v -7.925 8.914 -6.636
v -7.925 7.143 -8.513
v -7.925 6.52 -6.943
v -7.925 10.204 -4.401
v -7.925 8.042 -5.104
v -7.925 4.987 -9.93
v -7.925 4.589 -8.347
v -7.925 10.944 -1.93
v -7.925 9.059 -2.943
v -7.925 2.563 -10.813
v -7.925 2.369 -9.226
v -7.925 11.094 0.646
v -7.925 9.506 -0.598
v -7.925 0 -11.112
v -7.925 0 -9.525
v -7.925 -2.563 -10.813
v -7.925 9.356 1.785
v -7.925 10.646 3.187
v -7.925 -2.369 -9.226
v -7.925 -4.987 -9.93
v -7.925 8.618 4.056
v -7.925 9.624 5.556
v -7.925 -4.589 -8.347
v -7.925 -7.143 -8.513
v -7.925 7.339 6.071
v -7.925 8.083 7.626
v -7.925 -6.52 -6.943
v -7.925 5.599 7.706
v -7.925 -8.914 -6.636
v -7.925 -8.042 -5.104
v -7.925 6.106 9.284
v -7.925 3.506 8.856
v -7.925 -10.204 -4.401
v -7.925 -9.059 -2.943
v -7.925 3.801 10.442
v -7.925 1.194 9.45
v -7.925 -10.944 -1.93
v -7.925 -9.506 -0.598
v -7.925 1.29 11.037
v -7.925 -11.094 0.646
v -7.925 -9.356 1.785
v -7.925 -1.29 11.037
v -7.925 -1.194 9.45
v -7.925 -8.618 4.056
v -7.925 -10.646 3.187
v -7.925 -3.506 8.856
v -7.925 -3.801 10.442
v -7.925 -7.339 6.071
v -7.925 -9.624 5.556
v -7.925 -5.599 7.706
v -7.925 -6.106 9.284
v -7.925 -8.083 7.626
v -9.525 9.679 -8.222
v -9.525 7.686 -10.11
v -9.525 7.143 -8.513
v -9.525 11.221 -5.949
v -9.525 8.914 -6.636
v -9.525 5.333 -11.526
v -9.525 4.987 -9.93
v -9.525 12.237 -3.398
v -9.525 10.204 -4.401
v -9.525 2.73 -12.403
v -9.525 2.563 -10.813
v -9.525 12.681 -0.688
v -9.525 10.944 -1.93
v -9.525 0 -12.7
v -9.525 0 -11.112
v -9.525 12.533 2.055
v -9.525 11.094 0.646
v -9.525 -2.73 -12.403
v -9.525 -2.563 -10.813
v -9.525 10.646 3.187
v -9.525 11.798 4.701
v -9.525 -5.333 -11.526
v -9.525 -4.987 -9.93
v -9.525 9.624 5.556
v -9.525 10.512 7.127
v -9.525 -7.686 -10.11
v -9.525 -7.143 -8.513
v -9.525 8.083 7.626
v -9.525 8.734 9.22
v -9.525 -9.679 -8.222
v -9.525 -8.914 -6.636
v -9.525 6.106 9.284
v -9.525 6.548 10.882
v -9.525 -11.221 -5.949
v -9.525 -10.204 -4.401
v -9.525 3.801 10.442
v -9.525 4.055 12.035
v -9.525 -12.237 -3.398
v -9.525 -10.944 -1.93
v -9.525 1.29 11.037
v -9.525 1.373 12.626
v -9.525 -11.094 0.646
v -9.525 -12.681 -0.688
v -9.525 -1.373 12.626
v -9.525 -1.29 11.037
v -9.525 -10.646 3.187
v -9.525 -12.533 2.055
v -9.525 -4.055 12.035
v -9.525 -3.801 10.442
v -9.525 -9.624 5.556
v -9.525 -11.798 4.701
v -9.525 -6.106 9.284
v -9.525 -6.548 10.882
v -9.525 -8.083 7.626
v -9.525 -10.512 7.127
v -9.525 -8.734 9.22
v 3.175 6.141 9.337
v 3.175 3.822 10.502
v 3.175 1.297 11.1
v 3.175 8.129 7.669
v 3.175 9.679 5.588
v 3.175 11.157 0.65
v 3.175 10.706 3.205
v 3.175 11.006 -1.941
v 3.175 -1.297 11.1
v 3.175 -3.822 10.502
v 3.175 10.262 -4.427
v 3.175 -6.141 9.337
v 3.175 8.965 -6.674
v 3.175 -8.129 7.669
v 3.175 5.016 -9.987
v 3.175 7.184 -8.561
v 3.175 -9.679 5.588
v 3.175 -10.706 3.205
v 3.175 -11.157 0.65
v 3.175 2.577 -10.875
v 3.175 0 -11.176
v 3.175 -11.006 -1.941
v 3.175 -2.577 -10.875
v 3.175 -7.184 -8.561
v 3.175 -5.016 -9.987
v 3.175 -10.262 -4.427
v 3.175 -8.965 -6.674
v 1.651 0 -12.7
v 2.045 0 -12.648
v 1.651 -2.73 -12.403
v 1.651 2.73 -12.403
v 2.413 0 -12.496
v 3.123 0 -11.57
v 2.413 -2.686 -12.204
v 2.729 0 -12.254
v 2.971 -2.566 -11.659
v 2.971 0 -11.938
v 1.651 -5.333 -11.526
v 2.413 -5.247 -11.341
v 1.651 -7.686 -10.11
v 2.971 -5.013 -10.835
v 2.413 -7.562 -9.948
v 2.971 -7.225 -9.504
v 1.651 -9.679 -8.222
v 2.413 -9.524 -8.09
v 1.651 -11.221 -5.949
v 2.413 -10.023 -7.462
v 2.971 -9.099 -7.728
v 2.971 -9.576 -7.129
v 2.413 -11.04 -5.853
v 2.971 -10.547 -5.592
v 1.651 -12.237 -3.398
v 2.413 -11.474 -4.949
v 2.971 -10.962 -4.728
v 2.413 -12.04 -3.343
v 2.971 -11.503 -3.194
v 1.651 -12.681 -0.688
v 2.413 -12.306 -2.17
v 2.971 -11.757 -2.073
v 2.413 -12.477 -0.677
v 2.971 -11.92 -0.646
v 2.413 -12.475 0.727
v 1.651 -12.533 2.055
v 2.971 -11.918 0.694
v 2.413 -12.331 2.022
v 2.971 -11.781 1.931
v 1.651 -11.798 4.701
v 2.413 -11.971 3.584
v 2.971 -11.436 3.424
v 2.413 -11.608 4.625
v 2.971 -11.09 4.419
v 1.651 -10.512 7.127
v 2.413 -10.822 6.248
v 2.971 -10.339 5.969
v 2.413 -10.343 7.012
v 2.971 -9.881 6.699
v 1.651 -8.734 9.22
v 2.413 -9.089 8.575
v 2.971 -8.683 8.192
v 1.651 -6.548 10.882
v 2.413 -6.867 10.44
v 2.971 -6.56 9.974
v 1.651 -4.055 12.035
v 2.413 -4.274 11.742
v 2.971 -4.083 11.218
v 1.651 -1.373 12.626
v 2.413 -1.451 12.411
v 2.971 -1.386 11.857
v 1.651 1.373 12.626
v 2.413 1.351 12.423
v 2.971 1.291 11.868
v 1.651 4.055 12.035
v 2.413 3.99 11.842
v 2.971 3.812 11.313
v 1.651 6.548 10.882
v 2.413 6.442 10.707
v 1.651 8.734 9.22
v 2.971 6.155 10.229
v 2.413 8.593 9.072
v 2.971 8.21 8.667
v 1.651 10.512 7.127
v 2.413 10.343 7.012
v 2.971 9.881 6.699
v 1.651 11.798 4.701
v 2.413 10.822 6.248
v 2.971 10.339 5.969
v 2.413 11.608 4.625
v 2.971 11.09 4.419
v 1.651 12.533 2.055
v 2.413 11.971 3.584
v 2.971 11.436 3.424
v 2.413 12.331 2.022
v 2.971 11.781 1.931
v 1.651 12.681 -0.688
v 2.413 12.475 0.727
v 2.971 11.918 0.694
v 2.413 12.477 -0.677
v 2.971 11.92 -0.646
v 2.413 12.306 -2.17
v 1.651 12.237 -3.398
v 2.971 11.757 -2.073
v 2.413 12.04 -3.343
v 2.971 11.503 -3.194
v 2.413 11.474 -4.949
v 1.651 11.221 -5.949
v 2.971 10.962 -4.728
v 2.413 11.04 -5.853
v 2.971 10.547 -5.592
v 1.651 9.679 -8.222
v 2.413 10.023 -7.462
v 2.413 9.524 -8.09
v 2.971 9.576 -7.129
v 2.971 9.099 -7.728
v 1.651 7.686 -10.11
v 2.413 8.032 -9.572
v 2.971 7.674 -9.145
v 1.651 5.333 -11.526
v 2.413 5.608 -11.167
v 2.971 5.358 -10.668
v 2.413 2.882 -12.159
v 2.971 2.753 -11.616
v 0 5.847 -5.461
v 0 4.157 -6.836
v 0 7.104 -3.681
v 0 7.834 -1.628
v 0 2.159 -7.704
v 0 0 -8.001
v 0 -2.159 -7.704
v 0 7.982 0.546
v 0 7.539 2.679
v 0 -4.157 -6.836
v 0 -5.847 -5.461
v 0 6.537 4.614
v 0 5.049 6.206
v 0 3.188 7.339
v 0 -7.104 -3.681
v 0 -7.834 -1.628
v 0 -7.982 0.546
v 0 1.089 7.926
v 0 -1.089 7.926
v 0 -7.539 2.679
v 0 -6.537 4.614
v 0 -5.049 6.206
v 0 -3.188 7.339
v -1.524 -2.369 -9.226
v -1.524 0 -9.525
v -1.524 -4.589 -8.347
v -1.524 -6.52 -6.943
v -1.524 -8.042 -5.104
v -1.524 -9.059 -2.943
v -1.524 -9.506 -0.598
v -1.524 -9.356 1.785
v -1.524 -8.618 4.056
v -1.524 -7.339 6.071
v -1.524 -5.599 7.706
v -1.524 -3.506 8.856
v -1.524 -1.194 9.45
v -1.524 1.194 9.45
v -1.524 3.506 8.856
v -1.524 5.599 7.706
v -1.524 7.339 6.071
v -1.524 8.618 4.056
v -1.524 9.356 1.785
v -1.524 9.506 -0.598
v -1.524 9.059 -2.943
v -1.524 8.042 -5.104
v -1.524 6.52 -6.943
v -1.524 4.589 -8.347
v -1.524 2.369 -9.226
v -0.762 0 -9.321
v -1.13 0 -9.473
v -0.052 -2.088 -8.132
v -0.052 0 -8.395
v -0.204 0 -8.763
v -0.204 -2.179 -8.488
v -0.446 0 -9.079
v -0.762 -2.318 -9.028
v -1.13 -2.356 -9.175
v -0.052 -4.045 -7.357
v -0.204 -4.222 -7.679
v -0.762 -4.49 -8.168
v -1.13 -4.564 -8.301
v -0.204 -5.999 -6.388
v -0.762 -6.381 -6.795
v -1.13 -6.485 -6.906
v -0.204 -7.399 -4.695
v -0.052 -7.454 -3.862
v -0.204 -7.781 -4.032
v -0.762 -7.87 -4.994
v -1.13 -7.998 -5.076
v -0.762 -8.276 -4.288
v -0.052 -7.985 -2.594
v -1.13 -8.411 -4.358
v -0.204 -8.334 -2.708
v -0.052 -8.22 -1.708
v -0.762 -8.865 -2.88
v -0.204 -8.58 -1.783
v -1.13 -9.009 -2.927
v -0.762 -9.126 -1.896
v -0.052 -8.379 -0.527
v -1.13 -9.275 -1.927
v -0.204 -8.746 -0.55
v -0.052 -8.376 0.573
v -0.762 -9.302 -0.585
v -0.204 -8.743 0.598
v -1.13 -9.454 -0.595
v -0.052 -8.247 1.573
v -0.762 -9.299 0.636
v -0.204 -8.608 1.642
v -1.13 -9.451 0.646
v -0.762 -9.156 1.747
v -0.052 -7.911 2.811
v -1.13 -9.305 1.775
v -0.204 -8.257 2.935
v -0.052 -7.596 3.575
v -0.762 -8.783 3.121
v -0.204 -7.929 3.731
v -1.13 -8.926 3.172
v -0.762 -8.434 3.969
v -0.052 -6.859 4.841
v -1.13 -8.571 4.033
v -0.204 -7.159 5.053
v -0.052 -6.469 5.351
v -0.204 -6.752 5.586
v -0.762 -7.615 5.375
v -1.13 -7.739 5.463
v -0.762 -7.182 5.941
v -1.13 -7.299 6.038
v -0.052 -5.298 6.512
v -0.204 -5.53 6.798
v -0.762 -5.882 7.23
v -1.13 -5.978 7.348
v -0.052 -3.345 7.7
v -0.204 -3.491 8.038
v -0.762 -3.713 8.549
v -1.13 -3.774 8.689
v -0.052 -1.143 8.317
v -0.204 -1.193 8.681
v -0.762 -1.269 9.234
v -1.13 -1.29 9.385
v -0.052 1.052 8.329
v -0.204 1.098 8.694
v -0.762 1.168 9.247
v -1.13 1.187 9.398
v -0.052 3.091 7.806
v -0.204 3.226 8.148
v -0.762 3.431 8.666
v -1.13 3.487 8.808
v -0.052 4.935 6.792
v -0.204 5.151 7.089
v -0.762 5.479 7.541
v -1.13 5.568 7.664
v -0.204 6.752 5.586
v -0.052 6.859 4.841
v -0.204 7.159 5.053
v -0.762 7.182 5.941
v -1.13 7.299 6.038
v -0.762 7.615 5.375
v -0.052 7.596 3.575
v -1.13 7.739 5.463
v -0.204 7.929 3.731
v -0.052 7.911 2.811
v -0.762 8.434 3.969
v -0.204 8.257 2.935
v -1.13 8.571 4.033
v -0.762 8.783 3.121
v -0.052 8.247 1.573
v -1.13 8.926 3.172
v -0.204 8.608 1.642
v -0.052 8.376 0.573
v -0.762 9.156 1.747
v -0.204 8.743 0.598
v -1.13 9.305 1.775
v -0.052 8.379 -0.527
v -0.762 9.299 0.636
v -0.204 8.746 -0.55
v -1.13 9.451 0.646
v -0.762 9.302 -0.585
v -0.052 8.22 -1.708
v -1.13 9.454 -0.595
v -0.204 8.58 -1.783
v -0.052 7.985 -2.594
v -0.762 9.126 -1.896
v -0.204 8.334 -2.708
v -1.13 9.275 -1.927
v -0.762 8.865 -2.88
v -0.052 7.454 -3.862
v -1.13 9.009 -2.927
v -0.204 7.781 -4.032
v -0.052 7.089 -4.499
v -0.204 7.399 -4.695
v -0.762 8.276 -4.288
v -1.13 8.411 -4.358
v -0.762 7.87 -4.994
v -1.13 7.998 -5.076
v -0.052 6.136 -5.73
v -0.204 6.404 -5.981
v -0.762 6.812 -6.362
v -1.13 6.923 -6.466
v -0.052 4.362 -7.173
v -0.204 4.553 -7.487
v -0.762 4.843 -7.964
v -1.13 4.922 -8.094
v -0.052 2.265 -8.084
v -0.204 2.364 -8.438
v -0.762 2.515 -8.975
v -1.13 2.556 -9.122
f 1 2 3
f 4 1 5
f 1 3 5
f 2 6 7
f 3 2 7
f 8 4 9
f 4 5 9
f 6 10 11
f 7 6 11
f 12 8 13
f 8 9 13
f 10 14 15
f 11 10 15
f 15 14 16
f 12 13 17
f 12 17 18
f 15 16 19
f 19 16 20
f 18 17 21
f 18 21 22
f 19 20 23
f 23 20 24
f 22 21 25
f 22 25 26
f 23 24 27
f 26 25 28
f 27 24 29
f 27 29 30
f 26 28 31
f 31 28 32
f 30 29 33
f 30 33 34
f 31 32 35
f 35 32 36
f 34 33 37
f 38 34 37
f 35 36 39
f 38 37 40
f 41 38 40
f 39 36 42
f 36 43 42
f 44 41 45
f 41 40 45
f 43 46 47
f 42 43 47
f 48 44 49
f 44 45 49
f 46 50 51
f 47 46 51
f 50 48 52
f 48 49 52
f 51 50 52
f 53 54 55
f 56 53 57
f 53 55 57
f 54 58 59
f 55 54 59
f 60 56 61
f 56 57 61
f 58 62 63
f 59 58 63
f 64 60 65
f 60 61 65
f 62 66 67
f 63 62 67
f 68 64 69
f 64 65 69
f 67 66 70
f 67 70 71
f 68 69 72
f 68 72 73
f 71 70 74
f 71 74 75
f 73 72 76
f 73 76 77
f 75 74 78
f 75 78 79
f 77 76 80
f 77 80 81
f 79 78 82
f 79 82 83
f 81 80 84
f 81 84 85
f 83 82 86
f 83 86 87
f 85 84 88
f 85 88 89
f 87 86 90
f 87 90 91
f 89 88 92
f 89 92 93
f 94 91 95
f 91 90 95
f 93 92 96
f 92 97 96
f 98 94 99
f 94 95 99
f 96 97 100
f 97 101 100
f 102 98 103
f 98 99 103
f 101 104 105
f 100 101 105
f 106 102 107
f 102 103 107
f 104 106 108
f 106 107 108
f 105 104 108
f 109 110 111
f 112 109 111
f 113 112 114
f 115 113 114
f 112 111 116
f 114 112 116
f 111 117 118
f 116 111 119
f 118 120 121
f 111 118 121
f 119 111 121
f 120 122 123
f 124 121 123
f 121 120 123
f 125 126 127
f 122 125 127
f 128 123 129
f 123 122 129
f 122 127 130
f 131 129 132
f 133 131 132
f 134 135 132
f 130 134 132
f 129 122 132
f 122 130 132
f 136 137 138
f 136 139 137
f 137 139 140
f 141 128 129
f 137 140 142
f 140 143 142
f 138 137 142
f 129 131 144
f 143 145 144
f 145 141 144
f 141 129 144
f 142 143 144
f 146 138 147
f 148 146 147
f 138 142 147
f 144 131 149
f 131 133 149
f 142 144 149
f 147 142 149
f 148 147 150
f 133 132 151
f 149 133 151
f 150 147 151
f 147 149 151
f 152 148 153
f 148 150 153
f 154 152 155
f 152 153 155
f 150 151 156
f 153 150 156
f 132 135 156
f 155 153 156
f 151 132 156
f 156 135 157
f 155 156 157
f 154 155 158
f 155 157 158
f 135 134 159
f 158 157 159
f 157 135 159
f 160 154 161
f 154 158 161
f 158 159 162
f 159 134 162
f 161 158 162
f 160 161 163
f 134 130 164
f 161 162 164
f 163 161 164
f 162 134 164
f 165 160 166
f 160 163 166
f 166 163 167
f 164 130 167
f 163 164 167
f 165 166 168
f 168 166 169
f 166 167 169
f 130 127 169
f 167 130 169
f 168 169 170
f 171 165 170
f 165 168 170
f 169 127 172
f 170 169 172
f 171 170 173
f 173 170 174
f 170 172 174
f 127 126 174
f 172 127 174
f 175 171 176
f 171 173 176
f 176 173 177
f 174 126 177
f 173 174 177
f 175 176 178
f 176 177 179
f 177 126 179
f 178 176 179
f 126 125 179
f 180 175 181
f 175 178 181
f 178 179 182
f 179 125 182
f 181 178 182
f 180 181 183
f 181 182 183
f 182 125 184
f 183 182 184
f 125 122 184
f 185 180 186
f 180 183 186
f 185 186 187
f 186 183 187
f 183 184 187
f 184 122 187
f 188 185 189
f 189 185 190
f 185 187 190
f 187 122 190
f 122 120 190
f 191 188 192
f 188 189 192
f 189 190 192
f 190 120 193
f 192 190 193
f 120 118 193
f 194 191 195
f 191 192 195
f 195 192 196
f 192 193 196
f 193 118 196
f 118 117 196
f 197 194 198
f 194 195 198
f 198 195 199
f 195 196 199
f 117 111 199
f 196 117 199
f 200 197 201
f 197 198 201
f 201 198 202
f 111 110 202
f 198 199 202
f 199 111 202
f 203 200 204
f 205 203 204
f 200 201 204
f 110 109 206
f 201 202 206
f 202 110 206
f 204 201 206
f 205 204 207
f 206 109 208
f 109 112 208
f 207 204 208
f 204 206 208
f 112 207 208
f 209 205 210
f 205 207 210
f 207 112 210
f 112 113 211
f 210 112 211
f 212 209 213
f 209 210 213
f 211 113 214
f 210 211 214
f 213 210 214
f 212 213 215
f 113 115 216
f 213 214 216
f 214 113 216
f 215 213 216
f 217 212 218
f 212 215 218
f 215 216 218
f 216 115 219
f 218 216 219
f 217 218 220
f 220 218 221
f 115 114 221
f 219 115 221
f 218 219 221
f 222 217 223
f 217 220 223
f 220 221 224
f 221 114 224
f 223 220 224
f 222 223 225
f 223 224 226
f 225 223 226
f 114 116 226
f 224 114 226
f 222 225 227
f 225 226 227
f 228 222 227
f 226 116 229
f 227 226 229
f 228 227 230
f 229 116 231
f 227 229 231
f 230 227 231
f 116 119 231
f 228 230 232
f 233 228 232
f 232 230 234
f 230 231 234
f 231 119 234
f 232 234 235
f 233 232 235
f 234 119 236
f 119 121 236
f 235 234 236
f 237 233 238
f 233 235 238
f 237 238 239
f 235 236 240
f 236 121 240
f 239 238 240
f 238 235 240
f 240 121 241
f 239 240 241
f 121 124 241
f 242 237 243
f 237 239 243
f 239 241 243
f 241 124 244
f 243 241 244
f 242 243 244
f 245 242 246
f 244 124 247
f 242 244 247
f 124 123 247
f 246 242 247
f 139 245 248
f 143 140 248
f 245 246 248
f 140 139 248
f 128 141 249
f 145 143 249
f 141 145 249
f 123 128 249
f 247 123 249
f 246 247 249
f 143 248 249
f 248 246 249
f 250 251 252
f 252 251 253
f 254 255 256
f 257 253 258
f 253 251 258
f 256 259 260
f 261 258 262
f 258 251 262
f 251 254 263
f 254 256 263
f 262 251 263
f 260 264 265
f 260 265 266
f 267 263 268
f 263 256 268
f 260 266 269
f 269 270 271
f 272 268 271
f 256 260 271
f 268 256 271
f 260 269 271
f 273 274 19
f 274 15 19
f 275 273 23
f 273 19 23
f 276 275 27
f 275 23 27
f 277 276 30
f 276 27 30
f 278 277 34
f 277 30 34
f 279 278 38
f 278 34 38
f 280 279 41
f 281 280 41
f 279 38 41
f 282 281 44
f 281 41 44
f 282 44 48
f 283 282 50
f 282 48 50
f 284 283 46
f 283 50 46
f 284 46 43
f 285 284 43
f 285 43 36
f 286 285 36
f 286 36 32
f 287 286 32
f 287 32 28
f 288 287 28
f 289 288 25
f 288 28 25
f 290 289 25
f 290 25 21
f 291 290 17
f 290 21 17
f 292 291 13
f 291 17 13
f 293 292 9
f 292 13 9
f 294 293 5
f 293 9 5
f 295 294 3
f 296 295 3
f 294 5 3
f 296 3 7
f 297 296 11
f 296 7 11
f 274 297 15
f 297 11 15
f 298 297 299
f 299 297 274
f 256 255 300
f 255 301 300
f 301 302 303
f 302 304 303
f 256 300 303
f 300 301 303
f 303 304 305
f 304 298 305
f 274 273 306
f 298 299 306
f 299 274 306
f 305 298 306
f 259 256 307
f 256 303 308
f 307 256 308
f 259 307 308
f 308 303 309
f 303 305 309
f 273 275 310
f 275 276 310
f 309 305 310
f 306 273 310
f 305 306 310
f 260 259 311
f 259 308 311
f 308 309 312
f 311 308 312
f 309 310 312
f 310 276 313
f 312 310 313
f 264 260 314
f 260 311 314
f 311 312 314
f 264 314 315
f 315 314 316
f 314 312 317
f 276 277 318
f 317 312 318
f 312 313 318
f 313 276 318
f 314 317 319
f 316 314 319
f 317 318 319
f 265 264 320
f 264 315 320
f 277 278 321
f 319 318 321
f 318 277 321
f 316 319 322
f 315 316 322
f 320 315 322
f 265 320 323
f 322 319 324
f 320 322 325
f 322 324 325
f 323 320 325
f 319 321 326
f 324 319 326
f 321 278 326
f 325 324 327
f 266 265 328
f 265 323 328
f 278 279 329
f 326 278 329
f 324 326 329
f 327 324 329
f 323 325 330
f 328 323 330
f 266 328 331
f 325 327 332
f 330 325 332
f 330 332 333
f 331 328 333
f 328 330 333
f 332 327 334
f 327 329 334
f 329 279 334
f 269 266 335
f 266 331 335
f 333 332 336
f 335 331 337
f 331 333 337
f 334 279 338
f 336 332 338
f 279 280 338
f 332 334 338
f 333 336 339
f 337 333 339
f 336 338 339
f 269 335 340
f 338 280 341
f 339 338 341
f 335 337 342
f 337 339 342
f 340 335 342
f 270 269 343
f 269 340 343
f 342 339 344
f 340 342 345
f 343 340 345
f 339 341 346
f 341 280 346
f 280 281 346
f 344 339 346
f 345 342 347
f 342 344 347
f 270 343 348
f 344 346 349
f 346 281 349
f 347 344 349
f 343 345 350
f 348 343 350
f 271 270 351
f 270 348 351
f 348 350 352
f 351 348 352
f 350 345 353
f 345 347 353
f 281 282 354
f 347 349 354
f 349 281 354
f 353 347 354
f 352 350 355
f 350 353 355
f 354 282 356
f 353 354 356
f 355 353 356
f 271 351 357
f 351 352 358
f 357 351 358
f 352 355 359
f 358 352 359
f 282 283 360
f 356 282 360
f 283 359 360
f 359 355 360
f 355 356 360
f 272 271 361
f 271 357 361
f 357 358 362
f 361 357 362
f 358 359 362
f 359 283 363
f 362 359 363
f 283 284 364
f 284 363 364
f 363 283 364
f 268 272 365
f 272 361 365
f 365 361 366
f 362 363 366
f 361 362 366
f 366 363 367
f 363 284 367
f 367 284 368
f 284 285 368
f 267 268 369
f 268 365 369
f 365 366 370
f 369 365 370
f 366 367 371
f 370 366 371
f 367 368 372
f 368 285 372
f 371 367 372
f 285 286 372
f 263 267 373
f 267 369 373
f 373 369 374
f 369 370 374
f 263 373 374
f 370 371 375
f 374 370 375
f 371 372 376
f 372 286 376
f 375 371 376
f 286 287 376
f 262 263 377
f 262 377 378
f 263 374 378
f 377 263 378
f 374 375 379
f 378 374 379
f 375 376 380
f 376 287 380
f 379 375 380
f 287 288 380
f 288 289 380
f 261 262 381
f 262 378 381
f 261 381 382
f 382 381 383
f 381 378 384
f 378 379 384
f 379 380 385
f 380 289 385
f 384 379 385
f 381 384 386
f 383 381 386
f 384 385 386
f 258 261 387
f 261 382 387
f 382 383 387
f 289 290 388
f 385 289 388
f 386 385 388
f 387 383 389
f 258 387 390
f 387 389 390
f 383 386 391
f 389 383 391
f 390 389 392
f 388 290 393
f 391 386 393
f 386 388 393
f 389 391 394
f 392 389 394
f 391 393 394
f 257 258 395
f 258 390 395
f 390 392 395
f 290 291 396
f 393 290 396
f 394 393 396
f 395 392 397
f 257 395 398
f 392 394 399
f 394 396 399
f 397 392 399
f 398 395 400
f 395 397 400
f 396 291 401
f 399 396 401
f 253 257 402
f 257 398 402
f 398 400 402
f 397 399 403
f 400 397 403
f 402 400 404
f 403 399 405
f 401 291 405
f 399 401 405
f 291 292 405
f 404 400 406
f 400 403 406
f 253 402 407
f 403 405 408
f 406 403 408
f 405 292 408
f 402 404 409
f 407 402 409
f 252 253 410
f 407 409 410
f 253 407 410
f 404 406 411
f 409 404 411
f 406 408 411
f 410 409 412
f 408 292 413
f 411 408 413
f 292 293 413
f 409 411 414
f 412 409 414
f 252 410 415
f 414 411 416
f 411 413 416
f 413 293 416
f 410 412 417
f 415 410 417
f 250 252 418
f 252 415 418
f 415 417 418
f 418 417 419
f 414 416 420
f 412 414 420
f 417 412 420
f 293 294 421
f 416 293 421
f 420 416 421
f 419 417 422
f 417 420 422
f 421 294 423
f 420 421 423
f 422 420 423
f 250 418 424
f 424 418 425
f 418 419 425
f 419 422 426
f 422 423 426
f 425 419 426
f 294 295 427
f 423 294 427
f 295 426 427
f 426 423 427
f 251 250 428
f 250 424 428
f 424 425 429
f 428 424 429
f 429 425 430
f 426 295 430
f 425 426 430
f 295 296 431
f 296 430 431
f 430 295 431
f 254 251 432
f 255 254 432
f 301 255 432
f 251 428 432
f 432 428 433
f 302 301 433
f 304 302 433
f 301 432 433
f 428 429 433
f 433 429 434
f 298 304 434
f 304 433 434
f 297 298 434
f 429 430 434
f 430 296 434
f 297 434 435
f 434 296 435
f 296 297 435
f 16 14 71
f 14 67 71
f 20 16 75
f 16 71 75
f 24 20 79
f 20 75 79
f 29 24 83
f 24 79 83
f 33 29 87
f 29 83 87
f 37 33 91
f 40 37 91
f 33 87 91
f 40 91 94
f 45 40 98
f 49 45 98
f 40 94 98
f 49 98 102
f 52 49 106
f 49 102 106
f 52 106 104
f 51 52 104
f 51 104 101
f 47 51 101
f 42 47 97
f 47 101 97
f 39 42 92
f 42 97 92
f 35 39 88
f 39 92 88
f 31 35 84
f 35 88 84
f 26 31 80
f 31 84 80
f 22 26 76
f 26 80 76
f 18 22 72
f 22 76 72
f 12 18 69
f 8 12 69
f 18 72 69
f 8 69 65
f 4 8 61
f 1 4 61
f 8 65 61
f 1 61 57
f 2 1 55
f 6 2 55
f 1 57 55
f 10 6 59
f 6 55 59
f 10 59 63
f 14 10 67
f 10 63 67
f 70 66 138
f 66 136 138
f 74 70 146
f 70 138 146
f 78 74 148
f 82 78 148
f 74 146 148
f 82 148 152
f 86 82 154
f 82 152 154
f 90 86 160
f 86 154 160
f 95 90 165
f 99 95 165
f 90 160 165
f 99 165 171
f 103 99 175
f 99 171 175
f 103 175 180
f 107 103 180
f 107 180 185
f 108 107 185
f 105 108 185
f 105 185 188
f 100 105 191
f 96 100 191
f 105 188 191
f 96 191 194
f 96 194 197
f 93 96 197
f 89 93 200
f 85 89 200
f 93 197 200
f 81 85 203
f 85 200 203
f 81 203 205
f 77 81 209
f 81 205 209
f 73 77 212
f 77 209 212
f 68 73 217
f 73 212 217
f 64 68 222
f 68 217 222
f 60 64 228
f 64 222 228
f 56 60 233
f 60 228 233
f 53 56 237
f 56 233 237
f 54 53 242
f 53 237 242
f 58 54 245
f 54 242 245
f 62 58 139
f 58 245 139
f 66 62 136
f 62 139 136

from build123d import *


with BuildPart() as part:
    # Sketch2 → Revolve1 (revolve)
    with BuildSketch(Plane(origin=(0, 0, 0), x_dir=(1, 0, 0), z_dir=(0, 1, 0))):
        with BuildLine():
            Line((0, 0), (0, 8.001))
            ThreePointArc((0, 8.001), (-0.446369265, 9.078630735), (-1.524, 9.525))
            Line((-1.524, 9.525), (-7.9248, 9.525))
            Line((-7.9248, 9.525), (-7.9248, 11.1125))
            Line((-7.9248, 11.1125), (-9.525, 11.1125))
            Line((-9.525, 11.1125), (-9.525, 12.7))
            Line((-9.525, 12.7), (1.651, 12.7))
            ThreePointArc((1.651, 12.7), (2.728630735, 12.253630735), (3.175, 11.176))
            Line((3.175, 11.176), (3.175, 0))
            Line((3.175, 0), (0, 0))
        make_face()
    revolve(axis=Axis((3.175, 0, 0), (-1, 0, 0)))


solid = part.part
